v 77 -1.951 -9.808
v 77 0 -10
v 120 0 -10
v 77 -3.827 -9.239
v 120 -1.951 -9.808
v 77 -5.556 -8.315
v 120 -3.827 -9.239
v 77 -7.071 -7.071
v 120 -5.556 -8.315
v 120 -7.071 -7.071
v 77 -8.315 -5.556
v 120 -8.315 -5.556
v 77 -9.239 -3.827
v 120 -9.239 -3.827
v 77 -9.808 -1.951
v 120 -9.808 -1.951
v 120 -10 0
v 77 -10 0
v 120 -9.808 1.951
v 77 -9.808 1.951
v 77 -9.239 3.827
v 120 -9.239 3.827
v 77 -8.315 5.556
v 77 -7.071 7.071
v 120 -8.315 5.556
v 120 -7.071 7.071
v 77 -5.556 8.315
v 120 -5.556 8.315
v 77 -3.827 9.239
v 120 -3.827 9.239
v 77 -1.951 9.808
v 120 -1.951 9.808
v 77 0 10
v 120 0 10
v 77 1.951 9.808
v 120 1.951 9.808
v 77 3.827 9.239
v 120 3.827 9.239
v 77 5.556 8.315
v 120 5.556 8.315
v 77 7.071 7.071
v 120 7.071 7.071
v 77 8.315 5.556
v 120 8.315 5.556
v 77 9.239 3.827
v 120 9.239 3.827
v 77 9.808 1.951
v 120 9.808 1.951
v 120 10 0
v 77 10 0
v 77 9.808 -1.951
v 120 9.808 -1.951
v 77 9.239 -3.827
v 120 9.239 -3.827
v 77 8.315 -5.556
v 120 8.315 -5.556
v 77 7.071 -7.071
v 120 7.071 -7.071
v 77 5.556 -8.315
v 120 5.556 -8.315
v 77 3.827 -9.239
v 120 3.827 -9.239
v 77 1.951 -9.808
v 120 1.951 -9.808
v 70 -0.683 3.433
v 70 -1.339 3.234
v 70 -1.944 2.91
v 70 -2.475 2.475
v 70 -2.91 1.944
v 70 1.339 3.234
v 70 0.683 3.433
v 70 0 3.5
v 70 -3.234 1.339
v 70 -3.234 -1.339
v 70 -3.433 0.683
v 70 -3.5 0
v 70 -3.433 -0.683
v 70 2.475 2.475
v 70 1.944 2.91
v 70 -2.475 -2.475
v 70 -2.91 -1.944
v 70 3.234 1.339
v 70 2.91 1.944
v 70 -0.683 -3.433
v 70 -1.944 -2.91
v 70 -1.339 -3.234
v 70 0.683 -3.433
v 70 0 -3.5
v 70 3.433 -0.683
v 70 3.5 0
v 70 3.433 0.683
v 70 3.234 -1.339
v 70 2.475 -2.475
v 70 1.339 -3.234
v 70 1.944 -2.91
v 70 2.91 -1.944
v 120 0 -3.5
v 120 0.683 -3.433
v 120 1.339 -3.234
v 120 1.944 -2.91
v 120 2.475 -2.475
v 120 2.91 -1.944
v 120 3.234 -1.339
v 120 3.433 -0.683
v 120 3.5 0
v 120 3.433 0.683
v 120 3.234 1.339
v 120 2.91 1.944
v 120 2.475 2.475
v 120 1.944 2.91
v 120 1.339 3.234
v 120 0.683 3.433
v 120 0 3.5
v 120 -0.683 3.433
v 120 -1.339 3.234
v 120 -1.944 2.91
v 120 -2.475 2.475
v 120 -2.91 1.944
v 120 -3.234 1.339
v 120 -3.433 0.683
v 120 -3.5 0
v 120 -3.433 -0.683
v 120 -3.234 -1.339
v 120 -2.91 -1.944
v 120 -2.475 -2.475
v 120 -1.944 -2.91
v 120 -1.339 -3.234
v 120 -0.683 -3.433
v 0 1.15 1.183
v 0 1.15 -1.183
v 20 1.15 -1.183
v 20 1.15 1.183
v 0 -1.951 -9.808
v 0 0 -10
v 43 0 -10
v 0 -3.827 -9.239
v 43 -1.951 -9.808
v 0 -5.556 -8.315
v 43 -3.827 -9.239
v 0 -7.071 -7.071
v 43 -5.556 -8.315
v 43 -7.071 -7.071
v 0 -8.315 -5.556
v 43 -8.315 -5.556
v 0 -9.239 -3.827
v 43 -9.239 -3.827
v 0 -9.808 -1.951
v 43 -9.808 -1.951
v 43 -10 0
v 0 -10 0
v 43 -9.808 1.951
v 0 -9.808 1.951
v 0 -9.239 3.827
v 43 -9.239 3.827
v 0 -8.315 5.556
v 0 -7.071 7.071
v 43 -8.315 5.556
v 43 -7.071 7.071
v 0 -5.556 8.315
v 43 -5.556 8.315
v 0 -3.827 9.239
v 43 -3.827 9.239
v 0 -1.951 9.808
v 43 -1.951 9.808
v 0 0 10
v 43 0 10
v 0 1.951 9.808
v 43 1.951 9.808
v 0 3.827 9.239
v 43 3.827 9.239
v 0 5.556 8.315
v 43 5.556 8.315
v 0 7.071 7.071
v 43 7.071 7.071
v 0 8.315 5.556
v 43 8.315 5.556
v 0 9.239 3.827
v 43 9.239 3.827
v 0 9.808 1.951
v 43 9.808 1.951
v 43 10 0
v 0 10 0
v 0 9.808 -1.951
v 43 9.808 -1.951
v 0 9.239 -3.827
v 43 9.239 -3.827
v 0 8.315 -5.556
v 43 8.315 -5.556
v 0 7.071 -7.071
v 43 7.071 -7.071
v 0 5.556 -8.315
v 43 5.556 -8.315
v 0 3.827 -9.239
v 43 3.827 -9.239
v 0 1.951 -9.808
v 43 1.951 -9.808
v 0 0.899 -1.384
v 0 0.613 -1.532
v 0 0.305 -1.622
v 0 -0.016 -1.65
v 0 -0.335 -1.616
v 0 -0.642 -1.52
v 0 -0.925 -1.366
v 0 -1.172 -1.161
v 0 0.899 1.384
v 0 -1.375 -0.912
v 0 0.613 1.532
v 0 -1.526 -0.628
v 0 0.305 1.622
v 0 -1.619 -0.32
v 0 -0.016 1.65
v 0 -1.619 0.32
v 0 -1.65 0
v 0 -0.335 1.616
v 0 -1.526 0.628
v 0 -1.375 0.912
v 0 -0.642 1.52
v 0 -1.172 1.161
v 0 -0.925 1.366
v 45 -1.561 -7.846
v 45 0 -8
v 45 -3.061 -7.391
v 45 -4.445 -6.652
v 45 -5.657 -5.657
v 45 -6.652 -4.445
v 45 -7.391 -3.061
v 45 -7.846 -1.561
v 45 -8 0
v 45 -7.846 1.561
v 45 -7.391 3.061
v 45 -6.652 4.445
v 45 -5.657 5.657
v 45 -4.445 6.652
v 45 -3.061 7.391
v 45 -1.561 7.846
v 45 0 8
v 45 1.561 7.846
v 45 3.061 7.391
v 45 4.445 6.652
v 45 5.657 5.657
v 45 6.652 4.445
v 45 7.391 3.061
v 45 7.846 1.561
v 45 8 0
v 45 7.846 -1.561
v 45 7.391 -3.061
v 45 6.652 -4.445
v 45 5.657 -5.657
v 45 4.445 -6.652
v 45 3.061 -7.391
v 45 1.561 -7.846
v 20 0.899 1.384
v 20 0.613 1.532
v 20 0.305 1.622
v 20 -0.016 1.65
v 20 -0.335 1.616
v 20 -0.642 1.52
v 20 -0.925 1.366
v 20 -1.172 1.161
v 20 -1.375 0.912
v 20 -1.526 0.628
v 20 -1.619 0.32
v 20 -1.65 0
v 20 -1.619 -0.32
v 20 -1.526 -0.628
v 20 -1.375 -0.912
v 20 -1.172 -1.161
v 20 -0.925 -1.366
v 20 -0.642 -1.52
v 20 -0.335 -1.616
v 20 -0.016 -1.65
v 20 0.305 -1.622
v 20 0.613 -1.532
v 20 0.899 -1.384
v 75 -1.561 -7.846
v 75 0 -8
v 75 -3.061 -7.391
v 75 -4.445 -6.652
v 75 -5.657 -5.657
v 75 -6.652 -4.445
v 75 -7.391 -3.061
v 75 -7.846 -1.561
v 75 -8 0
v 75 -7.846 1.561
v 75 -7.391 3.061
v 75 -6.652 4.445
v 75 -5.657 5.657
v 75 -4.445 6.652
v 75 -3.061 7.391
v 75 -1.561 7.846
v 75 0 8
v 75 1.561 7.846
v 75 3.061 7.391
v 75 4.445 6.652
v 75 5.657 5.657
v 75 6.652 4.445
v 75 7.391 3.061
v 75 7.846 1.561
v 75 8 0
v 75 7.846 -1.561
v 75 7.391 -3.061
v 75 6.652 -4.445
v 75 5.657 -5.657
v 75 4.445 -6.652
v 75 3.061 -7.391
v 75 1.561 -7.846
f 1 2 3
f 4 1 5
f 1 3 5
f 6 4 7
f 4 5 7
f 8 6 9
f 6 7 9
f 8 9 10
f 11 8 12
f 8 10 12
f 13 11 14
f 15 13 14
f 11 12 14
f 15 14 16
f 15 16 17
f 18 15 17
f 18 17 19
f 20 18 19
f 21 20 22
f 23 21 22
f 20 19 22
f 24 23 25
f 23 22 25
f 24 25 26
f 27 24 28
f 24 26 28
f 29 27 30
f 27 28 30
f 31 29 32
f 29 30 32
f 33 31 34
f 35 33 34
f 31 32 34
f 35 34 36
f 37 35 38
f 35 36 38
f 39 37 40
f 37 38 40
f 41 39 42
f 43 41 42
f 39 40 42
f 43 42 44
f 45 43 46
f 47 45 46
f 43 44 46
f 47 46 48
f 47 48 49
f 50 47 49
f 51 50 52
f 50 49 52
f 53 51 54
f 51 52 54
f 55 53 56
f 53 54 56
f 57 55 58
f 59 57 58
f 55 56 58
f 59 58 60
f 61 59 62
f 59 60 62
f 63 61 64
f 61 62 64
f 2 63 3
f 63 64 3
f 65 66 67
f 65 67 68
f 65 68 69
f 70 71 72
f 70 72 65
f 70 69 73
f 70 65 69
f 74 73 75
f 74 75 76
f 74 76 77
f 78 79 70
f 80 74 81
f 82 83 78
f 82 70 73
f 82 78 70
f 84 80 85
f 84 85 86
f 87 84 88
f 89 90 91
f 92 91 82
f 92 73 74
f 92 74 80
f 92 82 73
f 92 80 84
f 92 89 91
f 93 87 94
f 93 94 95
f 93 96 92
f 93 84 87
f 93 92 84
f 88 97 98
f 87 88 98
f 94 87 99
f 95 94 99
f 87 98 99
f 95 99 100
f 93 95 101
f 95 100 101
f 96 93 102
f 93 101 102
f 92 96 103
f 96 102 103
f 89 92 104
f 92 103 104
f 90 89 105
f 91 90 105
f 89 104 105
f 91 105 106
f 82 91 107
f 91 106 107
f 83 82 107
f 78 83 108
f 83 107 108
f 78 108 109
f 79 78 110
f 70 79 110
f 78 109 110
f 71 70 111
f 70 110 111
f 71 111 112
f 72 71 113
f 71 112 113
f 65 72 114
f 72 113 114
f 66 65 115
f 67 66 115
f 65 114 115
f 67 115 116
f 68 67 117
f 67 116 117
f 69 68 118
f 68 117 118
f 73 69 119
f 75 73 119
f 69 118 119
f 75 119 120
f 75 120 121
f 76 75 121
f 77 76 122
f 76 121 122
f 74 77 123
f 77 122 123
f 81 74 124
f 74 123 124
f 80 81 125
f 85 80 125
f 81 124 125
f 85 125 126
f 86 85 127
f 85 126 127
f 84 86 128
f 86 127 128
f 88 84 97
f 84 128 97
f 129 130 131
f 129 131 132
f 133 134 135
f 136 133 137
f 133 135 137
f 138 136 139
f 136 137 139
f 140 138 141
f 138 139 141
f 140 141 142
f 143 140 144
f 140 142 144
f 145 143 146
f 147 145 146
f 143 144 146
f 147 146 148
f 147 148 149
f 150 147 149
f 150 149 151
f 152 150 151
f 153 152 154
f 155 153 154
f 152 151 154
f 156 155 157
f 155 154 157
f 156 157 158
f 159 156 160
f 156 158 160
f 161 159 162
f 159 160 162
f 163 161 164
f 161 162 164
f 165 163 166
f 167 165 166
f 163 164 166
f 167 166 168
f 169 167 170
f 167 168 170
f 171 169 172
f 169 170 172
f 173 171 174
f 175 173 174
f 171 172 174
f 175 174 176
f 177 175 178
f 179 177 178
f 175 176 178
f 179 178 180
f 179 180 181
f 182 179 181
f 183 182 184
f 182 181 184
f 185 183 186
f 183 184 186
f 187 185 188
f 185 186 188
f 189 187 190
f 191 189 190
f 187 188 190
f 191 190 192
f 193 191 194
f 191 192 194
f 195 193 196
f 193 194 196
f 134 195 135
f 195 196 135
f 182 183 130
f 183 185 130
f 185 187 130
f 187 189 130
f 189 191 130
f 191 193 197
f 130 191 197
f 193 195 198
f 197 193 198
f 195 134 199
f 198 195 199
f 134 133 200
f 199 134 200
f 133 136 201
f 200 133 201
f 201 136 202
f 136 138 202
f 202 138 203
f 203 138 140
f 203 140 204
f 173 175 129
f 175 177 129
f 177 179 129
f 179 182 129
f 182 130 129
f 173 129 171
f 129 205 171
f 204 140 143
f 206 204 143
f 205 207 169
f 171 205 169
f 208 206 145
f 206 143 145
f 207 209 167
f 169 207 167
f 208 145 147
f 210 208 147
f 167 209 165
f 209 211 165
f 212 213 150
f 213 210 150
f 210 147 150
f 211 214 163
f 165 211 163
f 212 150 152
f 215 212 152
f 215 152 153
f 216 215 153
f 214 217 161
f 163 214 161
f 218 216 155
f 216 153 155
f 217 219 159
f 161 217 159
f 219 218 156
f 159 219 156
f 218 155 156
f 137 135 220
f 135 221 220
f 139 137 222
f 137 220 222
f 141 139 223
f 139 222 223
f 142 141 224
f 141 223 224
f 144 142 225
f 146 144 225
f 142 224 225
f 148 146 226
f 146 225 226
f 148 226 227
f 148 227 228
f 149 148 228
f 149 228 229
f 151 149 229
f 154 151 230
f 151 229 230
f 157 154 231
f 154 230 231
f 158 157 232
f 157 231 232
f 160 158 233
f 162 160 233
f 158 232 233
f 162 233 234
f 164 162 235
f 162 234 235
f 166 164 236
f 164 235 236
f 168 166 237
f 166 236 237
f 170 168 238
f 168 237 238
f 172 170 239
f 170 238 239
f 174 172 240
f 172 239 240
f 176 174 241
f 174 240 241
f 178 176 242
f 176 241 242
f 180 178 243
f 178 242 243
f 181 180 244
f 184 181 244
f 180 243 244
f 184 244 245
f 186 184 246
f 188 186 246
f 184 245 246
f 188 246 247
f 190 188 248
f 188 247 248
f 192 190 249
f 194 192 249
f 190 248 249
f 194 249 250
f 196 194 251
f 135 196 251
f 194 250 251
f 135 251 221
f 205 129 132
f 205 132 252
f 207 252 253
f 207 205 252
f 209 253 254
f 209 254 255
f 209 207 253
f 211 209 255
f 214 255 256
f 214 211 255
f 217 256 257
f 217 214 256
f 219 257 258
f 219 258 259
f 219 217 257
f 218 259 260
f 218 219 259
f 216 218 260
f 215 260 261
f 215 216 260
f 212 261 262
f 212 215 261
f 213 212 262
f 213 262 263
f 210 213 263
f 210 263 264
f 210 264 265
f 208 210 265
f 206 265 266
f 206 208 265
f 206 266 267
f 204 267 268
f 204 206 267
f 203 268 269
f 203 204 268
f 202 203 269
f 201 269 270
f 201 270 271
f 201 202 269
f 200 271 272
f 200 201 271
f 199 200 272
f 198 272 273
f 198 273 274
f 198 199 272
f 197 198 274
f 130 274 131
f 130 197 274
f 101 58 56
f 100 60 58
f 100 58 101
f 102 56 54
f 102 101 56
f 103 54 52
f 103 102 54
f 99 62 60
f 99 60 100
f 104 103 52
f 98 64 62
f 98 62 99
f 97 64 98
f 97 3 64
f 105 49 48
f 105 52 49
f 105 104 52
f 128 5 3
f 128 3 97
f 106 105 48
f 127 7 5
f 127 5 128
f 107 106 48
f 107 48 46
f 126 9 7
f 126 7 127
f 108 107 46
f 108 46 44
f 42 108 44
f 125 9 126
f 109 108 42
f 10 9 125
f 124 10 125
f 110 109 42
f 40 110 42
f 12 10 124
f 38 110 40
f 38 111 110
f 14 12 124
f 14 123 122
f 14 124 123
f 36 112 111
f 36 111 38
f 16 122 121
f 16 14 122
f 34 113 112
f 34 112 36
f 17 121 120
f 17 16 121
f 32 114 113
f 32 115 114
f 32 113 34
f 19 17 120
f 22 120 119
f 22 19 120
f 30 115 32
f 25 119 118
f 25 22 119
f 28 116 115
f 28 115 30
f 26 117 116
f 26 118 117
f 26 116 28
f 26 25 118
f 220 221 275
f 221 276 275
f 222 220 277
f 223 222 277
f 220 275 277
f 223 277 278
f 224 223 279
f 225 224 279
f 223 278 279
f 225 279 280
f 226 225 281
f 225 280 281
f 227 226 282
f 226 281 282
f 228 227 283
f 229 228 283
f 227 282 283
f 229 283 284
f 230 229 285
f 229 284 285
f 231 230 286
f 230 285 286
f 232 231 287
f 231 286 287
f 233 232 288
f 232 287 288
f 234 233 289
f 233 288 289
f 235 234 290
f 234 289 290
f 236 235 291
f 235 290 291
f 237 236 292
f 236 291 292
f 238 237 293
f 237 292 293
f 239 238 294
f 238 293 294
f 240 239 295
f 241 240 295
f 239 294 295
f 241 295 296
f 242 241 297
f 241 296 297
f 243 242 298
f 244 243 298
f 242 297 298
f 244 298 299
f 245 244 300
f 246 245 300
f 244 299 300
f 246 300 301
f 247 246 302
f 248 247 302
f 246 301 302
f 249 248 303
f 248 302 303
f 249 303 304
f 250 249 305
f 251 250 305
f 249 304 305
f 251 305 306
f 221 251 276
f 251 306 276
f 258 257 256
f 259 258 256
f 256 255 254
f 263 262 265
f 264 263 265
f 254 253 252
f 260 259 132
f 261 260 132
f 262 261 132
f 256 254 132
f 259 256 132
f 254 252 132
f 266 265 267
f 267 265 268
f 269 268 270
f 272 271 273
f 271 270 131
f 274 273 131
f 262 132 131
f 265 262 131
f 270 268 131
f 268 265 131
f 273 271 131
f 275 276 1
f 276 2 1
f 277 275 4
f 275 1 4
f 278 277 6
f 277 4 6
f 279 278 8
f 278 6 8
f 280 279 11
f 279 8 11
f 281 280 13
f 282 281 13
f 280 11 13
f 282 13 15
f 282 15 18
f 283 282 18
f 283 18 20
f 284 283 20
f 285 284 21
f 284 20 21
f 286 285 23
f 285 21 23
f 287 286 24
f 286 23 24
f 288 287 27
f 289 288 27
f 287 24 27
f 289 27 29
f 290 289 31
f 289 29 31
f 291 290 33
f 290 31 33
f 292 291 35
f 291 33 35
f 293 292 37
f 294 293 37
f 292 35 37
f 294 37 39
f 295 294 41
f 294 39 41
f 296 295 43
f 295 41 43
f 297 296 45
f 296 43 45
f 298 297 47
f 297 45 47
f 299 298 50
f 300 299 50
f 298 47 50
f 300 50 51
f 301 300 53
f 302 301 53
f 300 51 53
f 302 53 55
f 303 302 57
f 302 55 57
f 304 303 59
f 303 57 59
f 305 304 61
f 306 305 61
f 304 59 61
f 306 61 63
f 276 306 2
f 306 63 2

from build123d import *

# Parameters (mm, degrees)
CUT_EXTRUDE1_DEPTH = 20
SKETCH5_R          = 3.5
CUT_EXTRUDE2_DEPTH = 50


with BuildPart() as part:
    # Sketch2 → Revolve1 (revolve)
    with BuildSketch(Plane.XY, mode=Mode.PRIVATE) as revolve1_sk:
        Polygon((0, 0), (0, 10), (43, 10), (45, 8), (75, 8), (77, 10), (120, 10), (120, 4), (120, 0), align=None)
    revolve(revolve1_sk.sketch.rotate(Axis((120, 0, 0), (-1, 0, 0)), 90), axis=Axis((120, 0, 0), (-1, 0, 0)))

    # Sketch3 → Cut-Extrude1 (cut)
    with BuildSketch(Plane.ZY):
        with BuildLine():
            Line((-1.183215957, 1.15), (1.183215957, 1.15))
            ThreePointArc((1.183215957, 1.15), (0, -1.65), (-1.183215957, 1.15))
        make_face()
    extrude(amount=-CUT_EXTRUDE1_DEPTH, mode=Mode.SUBTRACT)

    # Sketch5 → Cut-Extrude2 (cut)
    with BuildSketch(Plane(origin=(120, 0, 0), x_dir=(0, 0, -1), z_dir=(1, 0, 0))):
        Circle(SKETCH5_R)
    extrude(amount=-CUT_EXTRUDE2_DEPTH, mode=Mode.SUBTRACT)


solid = part.part
